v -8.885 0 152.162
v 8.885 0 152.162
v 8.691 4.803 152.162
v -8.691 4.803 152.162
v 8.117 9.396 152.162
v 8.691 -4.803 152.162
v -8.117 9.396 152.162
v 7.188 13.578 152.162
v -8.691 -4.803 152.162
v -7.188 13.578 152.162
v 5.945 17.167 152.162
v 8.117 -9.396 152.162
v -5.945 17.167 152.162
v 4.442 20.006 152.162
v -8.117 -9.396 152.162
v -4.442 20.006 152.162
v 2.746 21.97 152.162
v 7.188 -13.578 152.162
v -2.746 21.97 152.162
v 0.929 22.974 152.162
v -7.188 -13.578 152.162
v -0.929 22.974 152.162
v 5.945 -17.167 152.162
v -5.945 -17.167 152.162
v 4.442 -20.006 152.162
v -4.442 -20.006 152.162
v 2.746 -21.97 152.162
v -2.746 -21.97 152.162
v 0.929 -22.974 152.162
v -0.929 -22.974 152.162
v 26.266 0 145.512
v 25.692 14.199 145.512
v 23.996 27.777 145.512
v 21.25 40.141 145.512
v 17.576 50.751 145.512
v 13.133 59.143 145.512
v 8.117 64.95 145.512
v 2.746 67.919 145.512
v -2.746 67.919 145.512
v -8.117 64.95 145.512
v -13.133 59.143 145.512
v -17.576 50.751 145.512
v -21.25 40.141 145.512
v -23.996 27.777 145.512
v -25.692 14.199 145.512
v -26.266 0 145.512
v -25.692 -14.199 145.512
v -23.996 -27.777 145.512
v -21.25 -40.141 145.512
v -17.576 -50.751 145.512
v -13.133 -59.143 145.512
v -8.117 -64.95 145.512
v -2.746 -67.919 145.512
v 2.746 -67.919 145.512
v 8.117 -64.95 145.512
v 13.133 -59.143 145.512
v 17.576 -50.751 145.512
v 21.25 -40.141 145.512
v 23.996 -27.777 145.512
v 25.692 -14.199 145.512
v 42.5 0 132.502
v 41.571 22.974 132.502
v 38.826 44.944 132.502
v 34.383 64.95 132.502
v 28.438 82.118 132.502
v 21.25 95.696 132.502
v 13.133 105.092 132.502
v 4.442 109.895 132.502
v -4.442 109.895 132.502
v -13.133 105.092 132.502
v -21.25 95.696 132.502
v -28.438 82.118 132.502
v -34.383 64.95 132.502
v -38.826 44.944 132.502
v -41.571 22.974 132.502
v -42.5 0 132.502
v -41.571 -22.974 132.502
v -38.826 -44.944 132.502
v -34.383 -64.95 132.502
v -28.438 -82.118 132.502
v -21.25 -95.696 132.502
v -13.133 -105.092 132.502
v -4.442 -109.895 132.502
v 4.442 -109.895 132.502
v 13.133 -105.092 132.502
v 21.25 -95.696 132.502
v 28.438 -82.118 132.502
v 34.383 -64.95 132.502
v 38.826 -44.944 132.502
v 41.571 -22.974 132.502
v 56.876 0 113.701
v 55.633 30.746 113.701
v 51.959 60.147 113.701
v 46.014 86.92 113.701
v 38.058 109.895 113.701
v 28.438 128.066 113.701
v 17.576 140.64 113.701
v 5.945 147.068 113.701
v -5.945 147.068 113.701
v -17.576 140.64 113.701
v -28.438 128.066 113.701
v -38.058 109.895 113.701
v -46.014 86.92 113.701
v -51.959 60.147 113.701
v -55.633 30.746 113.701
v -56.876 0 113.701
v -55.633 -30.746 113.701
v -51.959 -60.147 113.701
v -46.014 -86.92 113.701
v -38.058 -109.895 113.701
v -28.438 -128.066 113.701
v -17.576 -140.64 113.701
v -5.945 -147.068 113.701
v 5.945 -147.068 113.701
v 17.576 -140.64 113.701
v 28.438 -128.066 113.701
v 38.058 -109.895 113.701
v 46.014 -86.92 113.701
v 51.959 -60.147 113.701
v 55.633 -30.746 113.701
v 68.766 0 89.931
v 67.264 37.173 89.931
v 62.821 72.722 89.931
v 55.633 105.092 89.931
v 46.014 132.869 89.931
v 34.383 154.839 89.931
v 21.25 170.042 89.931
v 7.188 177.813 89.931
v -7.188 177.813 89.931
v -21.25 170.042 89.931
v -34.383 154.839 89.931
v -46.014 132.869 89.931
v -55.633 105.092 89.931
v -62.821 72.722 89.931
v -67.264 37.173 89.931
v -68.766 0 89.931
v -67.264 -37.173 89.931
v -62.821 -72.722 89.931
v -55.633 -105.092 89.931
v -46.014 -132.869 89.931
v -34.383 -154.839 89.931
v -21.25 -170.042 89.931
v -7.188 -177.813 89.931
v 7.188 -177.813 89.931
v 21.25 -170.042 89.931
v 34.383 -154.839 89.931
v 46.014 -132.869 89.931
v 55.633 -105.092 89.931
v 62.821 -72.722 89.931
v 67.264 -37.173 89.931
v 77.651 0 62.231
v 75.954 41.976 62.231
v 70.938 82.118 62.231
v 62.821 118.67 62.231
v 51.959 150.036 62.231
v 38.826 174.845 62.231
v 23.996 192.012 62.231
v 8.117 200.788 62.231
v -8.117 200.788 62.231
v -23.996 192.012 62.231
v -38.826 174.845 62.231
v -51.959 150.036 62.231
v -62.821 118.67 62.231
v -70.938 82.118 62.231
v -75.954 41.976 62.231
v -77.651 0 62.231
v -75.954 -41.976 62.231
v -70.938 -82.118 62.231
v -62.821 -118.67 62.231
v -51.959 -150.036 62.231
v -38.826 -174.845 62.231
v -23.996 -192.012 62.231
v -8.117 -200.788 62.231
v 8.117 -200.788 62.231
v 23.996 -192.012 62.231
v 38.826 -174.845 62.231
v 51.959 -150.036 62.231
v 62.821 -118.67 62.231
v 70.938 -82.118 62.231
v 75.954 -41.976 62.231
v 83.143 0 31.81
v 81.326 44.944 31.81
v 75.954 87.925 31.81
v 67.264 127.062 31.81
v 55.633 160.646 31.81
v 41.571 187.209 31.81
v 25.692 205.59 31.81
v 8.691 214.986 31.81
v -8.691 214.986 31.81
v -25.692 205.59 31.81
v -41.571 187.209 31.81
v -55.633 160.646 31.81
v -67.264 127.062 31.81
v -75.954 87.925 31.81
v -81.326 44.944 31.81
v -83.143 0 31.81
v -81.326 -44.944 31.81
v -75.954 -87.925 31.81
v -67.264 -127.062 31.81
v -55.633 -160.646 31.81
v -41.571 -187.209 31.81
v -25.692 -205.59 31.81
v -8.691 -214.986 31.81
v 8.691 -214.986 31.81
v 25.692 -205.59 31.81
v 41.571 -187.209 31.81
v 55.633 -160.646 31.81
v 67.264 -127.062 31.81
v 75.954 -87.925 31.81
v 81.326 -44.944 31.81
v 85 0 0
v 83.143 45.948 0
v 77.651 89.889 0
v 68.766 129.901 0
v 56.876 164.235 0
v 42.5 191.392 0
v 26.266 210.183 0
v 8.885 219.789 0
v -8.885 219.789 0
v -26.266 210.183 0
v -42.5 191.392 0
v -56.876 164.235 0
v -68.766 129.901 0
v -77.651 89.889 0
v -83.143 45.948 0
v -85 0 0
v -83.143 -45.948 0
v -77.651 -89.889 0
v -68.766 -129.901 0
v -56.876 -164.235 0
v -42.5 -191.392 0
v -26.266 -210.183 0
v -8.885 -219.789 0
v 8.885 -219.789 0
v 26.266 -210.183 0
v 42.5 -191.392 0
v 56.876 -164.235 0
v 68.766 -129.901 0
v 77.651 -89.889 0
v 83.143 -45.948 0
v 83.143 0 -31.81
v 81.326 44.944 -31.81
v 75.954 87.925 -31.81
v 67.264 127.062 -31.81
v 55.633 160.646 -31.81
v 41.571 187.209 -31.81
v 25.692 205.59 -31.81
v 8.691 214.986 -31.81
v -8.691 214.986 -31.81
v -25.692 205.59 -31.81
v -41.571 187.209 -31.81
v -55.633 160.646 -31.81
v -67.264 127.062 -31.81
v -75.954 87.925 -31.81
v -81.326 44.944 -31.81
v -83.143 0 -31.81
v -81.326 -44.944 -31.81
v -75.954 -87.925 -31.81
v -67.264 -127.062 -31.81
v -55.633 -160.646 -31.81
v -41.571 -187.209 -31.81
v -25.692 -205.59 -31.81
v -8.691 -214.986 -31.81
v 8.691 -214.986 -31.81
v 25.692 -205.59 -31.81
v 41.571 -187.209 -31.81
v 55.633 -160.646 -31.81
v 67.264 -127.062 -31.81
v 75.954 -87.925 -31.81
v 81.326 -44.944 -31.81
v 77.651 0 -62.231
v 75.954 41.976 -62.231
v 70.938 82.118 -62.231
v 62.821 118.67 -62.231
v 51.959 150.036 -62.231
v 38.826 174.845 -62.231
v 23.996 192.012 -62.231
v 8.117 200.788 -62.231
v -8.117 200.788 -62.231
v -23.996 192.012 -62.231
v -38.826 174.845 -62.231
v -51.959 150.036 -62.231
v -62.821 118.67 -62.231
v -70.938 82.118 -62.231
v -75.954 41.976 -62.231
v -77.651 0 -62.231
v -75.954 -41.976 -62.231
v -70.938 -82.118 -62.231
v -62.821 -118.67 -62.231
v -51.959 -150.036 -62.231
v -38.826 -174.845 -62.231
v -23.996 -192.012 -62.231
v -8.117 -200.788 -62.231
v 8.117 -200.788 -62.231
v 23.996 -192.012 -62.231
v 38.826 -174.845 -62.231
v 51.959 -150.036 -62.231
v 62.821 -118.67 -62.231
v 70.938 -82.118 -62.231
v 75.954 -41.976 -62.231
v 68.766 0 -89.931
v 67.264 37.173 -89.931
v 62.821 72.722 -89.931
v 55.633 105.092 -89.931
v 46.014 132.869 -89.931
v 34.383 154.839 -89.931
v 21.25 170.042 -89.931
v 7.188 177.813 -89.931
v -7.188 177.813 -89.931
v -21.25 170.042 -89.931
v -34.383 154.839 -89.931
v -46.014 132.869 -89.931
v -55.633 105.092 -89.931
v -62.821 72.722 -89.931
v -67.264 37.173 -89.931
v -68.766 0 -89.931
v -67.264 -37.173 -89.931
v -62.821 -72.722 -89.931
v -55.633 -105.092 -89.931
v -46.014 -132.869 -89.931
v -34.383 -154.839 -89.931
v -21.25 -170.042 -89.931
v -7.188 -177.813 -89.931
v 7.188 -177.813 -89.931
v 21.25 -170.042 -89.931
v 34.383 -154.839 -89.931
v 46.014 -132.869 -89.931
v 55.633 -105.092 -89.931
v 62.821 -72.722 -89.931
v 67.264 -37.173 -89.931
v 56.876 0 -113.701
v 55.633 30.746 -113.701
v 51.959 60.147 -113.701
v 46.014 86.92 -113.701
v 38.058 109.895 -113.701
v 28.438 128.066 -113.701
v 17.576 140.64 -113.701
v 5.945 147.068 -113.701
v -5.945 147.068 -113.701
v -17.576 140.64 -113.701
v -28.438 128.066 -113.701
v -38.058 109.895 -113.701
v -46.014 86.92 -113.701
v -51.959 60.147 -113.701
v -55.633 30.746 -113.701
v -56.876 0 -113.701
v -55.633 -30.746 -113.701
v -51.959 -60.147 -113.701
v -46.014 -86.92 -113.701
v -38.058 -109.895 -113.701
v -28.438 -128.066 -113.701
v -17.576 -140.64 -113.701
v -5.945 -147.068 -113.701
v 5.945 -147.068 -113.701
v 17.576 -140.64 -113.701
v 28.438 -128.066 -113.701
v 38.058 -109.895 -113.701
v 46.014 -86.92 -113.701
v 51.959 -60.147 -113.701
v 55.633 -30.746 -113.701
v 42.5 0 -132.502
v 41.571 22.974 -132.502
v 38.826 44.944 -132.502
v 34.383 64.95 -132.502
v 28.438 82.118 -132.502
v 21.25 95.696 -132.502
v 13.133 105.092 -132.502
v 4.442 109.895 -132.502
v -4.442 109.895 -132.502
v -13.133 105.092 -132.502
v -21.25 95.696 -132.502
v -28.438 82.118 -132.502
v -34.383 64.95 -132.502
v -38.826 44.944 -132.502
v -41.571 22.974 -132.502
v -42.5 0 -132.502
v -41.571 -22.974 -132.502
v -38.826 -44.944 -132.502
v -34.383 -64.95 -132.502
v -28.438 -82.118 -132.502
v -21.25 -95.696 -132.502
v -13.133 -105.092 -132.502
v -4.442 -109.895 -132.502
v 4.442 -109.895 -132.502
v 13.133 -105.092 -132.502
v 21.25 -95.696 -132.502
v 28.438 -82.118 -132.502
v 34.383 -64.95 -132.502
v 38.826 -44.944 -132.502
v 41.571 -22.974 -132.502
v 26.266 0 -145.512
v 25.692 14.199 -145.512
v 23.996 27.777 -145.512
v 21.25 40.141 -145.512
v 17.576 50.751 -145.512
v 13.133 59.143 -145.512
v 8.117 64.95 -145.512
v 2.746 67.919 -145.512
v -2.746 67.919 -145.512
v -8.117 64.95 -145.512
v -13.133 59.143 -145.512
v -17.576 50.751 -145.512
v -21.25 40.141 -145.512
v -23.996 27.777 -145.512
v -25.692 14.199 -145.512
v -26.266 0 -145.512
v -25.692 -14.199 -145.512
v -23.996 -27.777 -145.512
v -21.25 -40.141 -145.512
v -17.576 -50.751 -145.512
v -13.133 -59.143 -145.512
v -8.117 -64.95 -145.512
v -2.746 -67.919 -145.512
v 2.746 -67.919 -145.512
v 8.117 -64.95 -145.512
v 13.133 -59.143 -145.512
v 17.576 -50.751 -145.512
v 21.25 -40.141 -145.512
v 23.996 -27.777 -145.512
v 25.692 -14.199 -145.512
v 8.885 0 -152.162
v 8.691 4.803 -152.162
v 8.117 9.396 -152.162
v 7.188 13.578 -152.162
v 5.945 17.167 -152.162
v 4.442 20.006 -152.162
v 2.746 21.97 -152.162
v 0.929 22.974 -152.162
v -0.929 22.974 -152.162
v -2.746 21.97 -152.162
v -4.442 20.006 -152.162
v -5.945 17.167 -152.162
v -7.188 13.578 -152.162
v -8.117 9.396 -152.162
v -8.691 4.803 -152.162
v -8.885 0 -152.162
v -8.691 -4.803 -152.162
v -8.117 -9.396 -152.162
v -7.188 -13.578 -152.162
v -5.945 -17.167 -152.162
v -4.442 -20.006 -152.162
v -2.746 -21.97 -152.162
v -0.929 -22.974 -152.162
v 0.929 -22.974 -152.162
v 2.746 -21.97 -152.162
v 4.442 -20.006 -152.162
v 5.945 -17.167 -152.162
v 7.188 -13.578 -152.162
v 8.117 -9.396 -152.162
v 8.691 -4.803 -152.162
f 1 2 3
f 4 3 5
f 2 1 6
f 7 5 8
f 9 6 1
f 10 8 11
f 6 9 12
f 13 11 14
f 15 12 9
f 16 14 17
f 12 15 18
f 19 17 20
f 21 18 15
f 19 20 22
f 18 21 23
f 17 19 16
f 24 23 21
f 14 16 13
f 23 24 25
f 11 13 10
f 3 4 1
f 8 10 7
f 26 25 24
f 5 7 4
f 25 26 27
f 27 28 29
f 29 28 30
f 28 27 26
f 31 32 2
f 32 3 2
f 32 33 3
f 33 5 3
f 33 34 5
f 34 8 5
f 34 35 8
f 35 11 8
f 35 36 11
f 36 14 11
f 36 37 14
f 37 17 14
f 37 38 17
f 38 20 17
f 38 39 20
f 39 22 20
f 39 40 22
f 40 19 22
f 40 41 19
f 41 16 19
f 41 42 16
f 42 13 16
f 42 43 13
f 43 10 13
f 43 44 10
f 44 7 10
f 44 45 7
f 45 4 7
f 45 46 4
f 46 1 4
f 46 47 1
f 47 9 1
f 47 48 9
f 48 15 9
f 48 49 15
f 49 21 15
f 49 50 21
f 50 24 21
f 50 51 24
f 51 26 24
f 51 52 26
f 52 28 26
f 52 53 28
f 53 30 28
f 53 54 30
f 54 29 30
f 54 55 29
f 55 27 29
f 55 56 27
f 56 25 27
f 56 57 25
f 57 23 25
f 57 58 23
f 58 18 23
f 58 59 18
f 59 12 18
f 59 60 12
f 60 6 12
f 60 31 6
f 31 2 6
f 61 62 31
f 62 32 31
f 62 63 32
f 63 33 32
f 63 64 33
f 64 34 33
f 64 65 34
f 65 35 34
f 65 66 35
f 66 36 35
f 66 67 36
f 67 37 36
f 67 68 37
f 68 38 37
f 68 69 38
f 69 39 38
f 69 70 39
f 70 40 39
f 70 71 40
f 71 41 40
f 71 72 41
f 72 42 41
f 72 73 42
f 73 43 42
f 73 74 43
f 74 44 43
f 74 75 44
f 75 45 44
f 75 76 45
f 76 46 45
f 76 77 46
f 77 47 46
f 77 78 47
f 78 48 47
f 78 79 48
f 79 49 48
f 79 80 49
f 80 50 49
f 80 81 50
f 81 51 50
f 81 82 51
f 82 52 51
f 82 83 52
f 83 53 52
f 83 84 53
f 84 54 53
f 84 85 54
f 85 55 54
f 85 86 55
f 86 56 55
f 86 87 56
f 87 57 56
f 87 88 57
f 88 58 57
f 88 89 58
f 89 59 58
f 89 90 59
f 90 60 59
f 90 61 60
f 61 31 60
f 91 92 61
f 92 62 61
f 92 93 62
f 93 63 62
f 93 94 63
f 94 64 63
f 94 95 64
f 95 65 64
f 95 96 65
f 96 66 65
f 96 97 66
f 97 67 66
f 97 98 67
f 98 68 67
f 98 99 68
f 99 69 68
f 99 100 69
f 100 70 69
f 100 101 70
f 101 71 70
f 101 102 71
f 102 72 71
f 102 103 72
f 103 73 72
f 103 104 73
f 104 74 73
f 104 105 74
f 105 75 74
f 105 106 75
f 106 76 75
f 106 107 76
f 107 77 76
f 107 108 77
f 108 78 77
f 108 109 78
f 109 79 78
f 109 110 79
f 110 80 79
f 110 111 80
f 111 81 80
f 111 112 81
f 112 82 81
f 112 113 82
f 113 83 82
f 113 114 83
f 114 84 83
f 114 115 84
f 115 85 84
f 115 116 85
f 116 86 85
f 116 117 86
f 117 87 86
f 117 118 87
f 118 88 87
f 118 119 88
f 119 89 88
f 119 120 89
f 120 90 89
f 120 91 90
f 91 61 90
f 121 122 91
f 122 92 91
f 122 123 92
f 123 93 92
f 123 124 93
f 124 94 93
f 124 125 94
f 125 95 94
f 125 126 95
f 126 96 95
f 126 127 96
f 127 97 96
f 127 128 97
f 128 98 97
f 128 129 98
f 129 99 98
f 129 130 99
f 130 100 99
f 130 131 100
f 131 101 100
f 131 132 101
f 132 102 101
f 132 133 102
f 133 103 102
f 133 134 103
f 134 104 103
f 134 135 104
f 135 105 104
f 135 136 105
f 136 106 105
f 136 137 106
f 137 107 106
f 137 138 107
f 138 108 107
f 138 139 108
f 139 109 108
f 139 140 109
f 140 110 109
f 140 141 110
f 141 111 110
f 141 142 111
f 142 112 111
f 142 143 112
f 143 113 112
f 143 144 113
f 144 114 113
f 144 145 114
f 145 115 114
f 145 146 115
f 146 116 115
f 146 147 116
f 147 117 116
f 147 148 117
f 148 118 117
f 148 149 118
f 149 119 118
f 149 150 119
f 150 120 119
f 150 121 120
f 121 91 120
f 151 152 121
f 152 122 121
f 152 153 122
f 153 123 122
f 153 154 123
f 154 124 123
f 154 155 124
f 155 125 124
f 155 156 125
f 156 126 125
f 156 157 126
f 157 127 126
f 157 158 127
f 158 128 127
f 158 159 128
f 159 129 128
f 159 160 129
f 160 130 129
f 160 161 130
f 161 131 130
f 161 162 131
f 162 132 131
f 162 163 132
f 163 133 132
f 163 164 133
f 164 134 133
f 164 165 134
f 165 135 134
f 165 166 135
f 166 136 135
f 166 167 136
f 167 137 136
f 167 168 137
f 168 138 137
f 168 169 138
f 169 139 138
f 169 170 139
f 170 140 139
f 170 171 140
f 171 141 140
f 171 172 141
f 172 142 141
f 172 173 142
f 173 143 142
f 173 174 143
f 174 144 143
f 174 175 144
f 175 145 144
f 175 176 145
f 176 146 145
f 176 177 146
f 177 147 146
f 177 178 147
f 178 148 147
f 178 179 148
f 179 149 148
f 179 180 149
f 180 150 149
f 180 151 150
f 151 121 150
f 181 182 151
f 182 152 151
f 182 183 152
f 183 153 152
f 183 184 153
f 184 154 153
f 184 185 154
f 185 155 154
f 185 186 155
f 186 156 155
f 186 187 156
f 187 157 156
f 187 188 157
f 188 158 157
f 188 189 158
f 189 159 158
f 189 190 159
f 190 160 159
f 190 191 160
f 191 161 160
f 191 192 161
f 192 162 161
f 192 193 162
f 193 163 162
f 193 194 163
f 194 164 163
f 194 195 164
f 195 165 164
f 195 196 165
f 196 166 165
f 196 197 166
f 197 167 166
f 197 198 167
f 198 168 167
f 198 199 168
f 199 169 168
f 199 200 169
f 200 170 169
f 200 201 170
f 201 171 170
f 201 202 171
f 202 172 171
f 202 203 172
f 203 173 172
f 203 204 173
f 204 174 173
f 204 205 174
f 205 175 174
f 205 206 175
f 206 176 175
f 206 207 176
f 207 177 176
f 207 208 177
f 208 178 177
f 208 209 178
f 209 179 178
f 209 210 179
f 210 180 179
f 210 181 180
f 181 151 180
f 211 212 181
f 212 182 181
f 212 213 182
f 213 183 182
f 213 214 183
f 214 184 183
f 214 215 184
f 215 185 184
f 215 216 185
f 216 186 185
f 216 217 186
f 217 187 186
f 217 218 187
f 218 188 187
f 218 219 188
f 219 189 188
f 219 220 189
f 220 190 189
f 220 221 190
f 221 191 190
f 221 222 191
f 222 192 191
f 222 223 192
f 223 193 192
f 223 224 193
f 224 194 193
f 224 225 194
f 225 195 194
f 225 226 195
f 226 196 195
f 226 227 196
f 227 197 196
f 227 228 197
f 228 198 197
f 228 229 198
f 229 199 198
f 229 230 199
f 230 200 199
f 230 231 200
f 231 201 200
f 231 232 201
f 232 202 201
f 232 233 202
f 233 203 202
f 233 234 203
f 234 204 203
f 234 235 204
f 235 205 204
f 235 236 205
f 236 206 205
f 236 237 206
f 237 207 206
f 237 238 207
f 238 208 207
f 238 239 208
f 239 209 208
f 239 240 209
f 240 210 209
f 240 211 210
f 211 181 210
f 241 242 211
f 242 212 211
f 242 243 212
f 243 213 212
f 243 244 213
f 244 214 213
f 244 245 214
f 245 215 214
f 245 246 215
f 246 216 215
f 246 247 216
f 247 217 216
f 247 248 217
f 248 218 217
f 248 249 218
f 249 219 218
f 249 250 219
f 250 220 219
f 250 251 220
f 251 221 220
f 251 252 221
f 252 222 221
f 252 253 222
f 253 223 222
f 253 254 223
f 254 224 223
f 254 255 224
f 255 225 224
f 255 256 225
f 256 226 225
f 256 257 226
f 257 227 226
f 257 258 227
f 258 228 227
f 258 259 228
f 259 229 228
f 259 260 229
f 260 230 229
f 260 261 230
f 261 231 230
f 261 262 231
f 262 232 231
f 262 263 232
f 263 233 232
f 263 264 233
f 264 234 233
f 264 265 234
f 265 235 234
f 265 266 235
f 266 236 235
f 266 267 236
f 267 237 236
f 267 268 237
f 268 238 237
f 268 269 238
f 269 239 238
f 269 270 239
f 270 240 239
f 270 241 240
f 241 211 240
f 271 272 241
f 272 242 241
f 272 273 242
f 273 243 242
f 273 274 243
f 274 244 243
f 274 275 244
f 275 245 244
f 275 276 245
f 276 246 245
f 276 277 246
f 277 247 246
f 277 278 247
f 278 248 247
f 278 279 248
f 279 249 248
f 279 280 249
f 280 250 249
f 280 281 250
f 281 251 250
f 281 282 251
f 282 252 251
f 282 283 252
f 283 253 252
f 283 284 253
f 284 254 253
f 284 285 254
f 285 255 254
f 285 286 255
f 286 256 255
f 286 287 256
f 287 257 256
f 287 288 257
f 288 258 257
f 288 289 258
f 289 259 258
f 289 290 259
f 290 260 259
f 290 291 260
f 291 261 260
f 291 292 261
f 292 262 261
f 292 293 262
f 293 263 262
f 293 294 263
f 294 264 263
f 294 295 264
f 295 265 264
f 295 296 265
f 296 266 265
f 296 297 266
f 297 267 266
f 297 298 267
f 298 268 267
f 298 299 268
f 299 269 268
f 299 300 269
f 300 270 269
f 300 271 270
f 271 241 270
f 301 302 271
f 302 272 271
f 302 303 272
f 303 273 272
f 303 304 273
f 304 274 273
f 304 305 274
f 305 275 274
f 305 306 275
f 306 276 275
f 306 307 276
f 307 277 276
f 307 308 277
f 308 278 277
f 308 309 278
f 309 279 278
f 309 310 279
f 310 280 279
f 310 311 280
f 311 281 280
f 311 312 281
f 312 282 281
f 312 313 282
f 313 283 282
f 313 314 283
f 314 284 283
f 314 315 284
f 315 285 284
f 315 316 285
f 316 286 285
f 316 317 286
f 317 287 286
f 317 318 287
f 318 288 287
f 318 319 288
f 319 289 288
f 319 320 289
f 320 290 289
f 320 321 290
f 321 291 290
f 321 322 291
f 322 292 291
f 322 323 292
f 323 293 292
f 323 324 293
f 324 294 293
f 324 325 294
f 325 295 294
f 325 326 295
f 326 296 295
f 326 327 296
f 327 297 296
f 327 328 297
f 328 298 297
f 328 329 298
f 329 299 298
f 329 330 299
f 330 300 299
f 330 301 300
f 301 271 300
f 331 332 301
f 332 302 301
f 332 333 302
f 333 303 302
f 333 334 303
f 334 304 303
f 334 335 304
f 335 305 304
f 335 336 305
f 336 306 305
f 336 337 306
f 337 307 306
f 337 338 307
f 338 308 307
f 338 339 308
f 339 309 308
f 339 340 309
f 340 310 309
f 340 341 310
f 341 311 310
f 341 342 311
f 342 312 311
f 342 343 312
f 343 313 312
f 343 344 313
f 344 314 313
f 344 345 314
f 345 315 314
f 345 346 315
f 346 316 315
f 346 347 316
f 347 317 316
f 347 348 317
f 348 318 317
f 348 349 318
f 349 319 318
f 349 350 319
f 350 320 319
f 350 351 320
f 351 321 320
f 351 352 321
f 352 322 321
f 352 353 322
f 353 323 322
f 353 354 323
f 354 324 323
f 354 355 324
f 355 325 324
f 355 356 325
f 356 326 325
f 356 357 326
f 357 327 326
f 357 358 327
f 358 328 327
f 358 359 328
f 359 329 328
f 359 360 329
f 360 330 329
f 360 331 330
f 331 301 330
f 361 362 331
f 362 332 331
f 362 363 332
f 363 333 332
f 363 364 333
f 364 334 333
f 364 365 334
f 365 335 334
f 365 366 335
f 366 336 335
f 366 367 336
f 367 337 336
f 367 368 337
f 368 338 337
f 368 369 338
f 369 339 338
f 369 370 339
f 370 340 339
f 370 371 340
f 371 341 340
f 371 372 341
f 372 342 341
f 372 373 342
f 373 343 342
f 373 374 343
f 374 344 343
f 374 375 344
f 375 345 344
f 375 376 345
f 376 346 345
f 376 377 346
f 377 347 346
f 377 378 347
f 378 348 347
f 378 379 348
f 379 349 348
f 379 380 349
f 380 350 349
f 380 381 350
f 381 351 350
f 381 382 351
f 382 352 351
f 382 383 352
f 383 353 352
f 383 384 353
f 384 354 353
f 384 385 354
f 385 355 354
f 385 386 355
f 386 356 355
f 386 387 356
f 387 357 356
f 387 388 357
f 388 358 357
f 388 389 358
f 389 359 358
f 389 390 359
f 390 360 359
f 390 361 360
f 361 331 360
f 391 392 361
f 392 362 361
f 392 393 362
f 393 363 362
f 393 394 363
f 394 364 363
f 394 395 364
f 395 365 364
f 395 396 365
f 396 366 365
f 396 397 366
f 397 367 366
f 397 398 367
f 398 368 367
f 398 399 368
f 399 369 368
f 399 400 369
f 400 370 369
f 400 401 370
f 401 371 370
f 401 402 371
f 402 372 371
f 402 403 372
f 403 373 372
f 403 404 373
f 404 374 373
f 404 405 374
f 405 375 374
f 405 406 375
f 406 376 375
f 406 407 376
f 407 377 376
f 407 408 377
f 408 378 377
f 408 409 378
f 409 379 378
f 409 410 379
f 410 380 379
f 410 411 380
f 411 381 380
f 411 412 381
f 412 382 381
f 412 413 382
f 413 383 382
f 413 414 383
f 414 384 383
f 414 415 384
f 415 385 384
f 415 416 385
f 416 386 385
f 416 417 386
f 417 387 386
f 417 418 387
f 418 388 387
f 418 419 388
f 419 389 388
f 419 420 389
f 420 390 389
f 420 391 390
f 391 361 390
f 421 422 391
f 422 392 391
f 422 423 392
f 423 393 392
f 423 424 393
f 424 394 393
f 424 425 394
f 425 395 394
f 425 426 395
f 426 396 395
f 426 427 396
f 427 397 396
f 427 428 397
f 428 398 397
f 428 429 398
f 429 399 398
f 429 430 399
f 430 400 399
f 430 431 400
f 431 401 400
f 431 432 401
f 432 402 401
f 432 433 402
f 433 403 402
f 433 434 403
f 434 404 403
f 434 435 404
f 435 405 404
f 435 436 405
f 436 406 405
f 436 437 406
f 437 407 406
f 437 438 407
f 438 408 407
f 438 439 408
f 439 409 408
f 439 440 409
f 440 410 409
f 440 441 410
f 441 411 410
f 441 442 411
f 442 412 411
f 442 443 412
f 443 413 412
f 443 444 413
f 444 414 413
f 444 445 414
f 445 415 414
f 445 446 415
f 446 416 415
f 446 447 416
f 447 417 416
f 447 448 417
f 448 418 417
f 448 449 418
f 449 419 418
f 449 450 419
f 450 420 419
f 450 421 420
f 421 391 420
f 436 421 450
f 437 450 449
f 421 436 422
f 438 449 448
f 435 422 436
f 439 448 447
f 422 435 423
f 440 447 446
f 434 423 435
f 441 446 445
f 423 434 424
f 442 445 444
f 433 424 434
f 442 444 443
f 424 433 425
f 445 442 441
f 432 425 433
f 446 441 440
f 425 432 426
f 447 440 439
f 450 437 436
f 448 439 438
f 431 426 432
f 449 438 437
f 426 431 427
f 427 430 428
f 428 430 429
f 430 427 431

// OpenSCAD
// Generated by SolidPython 1.0.1 on 2020-07-29 00:46:46


scale(v = [5, 13, 9]) {
	sphere(r = 17);
}
/***********************************************
*********      SolidPython code:      **********
************************************************
 
# import packages: SolidPython
from solid import *
from solid.utils import *
from itertools import chain, combinations, permutations


class Resize:

    def __init__(self, scad_file):
        self.scad_file = scad_file
        #self.scad_file = import_scad(scad_file)
        # cone/cylinder param:
        self.r1 = 0
        self.r2 = 0
        self.h = 0
        # rectangular prism param:
        self.w = 0
        self.l = 0
        # ellipse param:
        self.r = 0

    # import OpenScad code (file name corresponds to shape)


    # classify shape + parameters
    def assign(self, param1, param2, param3):
        if self.scad_file == 'cone.scad':
            self.r1 = param1
            self.r2 = param2
            self.h = param3
        elif self.scad_file == 'cylinder.scad':
            self.r1 = param1
            self.r2 = param2
            self.h = param3
        elif self.scad_file == 'rectangularPrism.scad':
            self.h = param1
            self.l = param2
            self.w = param3
        else:
            self.r = param1
            self.h = param2

    # resize parameters
    def iterate(self):
        x = range(3, 20, 2)
        i = 1
        if self.scad_file == 'cone.scad':
            tempList = list(permutations(x, 2))
            for temp in tempList:
                param1 = temp[0]
                param2 = temp[1]
                filepath = 'produced_scad_files/' + 'cone' + str(param1) + '_' + str(param2) + '_' + '.scad'
                scad_render_to_file(cylinder(h=param1, r1=param2, r2=0), filepath)

        elif self.scad_file == 'cylinder.scad':
            tempList = list(permutations(x, 3))
            for temp in tempList:
                param1 = temp[0]
                param2 = temp[1]
                filepath = 'produced_scad_files/' + 'cylinder' + str(param1) + '_' + str(param2) + '_' + '.scad'
                scad_render_to_file(cylinder(h=param1, r1=param2, r2=param2), filepath)

        elif self.scad_file == 'rectangularPrism.scad':
            tempList = list(permutations(x, 3))
            for temp in tempList:
                param1 = temp[0]
                param2 = temp[1]
                param3 = temp[2]
                filepath = 'produced_scad_files/' + 'rectangularPrism' + str(param1) + '_' + str(param2) + '_' + str(
                    param3) + '.scad'
                scad_render_to_file(cube(size=(param1, param2, param3)), filepath)

        elif self.scad_file == 'ellipse.scad':
            tempList = list(permutations(x, 4))
            for temp in tempList:
                param1 = temp[0]
                param2 = temp[1]
                param3 = temp[2]
                param4 = temp[3]
                filepath = 'produced_scad_files/' + 'ellipse' + str(param1) + '_' + str(param2) + '_' + str(param3) + '_' + str(param4) + '.scad'
                scad_render_to_file(scale([param1, param2, param3])(sphere(r=param4)), filepath)

    def render_to_scadfile(self):
        scad_render_to_file(scad, 'example.scad') 
 
************************************************/
